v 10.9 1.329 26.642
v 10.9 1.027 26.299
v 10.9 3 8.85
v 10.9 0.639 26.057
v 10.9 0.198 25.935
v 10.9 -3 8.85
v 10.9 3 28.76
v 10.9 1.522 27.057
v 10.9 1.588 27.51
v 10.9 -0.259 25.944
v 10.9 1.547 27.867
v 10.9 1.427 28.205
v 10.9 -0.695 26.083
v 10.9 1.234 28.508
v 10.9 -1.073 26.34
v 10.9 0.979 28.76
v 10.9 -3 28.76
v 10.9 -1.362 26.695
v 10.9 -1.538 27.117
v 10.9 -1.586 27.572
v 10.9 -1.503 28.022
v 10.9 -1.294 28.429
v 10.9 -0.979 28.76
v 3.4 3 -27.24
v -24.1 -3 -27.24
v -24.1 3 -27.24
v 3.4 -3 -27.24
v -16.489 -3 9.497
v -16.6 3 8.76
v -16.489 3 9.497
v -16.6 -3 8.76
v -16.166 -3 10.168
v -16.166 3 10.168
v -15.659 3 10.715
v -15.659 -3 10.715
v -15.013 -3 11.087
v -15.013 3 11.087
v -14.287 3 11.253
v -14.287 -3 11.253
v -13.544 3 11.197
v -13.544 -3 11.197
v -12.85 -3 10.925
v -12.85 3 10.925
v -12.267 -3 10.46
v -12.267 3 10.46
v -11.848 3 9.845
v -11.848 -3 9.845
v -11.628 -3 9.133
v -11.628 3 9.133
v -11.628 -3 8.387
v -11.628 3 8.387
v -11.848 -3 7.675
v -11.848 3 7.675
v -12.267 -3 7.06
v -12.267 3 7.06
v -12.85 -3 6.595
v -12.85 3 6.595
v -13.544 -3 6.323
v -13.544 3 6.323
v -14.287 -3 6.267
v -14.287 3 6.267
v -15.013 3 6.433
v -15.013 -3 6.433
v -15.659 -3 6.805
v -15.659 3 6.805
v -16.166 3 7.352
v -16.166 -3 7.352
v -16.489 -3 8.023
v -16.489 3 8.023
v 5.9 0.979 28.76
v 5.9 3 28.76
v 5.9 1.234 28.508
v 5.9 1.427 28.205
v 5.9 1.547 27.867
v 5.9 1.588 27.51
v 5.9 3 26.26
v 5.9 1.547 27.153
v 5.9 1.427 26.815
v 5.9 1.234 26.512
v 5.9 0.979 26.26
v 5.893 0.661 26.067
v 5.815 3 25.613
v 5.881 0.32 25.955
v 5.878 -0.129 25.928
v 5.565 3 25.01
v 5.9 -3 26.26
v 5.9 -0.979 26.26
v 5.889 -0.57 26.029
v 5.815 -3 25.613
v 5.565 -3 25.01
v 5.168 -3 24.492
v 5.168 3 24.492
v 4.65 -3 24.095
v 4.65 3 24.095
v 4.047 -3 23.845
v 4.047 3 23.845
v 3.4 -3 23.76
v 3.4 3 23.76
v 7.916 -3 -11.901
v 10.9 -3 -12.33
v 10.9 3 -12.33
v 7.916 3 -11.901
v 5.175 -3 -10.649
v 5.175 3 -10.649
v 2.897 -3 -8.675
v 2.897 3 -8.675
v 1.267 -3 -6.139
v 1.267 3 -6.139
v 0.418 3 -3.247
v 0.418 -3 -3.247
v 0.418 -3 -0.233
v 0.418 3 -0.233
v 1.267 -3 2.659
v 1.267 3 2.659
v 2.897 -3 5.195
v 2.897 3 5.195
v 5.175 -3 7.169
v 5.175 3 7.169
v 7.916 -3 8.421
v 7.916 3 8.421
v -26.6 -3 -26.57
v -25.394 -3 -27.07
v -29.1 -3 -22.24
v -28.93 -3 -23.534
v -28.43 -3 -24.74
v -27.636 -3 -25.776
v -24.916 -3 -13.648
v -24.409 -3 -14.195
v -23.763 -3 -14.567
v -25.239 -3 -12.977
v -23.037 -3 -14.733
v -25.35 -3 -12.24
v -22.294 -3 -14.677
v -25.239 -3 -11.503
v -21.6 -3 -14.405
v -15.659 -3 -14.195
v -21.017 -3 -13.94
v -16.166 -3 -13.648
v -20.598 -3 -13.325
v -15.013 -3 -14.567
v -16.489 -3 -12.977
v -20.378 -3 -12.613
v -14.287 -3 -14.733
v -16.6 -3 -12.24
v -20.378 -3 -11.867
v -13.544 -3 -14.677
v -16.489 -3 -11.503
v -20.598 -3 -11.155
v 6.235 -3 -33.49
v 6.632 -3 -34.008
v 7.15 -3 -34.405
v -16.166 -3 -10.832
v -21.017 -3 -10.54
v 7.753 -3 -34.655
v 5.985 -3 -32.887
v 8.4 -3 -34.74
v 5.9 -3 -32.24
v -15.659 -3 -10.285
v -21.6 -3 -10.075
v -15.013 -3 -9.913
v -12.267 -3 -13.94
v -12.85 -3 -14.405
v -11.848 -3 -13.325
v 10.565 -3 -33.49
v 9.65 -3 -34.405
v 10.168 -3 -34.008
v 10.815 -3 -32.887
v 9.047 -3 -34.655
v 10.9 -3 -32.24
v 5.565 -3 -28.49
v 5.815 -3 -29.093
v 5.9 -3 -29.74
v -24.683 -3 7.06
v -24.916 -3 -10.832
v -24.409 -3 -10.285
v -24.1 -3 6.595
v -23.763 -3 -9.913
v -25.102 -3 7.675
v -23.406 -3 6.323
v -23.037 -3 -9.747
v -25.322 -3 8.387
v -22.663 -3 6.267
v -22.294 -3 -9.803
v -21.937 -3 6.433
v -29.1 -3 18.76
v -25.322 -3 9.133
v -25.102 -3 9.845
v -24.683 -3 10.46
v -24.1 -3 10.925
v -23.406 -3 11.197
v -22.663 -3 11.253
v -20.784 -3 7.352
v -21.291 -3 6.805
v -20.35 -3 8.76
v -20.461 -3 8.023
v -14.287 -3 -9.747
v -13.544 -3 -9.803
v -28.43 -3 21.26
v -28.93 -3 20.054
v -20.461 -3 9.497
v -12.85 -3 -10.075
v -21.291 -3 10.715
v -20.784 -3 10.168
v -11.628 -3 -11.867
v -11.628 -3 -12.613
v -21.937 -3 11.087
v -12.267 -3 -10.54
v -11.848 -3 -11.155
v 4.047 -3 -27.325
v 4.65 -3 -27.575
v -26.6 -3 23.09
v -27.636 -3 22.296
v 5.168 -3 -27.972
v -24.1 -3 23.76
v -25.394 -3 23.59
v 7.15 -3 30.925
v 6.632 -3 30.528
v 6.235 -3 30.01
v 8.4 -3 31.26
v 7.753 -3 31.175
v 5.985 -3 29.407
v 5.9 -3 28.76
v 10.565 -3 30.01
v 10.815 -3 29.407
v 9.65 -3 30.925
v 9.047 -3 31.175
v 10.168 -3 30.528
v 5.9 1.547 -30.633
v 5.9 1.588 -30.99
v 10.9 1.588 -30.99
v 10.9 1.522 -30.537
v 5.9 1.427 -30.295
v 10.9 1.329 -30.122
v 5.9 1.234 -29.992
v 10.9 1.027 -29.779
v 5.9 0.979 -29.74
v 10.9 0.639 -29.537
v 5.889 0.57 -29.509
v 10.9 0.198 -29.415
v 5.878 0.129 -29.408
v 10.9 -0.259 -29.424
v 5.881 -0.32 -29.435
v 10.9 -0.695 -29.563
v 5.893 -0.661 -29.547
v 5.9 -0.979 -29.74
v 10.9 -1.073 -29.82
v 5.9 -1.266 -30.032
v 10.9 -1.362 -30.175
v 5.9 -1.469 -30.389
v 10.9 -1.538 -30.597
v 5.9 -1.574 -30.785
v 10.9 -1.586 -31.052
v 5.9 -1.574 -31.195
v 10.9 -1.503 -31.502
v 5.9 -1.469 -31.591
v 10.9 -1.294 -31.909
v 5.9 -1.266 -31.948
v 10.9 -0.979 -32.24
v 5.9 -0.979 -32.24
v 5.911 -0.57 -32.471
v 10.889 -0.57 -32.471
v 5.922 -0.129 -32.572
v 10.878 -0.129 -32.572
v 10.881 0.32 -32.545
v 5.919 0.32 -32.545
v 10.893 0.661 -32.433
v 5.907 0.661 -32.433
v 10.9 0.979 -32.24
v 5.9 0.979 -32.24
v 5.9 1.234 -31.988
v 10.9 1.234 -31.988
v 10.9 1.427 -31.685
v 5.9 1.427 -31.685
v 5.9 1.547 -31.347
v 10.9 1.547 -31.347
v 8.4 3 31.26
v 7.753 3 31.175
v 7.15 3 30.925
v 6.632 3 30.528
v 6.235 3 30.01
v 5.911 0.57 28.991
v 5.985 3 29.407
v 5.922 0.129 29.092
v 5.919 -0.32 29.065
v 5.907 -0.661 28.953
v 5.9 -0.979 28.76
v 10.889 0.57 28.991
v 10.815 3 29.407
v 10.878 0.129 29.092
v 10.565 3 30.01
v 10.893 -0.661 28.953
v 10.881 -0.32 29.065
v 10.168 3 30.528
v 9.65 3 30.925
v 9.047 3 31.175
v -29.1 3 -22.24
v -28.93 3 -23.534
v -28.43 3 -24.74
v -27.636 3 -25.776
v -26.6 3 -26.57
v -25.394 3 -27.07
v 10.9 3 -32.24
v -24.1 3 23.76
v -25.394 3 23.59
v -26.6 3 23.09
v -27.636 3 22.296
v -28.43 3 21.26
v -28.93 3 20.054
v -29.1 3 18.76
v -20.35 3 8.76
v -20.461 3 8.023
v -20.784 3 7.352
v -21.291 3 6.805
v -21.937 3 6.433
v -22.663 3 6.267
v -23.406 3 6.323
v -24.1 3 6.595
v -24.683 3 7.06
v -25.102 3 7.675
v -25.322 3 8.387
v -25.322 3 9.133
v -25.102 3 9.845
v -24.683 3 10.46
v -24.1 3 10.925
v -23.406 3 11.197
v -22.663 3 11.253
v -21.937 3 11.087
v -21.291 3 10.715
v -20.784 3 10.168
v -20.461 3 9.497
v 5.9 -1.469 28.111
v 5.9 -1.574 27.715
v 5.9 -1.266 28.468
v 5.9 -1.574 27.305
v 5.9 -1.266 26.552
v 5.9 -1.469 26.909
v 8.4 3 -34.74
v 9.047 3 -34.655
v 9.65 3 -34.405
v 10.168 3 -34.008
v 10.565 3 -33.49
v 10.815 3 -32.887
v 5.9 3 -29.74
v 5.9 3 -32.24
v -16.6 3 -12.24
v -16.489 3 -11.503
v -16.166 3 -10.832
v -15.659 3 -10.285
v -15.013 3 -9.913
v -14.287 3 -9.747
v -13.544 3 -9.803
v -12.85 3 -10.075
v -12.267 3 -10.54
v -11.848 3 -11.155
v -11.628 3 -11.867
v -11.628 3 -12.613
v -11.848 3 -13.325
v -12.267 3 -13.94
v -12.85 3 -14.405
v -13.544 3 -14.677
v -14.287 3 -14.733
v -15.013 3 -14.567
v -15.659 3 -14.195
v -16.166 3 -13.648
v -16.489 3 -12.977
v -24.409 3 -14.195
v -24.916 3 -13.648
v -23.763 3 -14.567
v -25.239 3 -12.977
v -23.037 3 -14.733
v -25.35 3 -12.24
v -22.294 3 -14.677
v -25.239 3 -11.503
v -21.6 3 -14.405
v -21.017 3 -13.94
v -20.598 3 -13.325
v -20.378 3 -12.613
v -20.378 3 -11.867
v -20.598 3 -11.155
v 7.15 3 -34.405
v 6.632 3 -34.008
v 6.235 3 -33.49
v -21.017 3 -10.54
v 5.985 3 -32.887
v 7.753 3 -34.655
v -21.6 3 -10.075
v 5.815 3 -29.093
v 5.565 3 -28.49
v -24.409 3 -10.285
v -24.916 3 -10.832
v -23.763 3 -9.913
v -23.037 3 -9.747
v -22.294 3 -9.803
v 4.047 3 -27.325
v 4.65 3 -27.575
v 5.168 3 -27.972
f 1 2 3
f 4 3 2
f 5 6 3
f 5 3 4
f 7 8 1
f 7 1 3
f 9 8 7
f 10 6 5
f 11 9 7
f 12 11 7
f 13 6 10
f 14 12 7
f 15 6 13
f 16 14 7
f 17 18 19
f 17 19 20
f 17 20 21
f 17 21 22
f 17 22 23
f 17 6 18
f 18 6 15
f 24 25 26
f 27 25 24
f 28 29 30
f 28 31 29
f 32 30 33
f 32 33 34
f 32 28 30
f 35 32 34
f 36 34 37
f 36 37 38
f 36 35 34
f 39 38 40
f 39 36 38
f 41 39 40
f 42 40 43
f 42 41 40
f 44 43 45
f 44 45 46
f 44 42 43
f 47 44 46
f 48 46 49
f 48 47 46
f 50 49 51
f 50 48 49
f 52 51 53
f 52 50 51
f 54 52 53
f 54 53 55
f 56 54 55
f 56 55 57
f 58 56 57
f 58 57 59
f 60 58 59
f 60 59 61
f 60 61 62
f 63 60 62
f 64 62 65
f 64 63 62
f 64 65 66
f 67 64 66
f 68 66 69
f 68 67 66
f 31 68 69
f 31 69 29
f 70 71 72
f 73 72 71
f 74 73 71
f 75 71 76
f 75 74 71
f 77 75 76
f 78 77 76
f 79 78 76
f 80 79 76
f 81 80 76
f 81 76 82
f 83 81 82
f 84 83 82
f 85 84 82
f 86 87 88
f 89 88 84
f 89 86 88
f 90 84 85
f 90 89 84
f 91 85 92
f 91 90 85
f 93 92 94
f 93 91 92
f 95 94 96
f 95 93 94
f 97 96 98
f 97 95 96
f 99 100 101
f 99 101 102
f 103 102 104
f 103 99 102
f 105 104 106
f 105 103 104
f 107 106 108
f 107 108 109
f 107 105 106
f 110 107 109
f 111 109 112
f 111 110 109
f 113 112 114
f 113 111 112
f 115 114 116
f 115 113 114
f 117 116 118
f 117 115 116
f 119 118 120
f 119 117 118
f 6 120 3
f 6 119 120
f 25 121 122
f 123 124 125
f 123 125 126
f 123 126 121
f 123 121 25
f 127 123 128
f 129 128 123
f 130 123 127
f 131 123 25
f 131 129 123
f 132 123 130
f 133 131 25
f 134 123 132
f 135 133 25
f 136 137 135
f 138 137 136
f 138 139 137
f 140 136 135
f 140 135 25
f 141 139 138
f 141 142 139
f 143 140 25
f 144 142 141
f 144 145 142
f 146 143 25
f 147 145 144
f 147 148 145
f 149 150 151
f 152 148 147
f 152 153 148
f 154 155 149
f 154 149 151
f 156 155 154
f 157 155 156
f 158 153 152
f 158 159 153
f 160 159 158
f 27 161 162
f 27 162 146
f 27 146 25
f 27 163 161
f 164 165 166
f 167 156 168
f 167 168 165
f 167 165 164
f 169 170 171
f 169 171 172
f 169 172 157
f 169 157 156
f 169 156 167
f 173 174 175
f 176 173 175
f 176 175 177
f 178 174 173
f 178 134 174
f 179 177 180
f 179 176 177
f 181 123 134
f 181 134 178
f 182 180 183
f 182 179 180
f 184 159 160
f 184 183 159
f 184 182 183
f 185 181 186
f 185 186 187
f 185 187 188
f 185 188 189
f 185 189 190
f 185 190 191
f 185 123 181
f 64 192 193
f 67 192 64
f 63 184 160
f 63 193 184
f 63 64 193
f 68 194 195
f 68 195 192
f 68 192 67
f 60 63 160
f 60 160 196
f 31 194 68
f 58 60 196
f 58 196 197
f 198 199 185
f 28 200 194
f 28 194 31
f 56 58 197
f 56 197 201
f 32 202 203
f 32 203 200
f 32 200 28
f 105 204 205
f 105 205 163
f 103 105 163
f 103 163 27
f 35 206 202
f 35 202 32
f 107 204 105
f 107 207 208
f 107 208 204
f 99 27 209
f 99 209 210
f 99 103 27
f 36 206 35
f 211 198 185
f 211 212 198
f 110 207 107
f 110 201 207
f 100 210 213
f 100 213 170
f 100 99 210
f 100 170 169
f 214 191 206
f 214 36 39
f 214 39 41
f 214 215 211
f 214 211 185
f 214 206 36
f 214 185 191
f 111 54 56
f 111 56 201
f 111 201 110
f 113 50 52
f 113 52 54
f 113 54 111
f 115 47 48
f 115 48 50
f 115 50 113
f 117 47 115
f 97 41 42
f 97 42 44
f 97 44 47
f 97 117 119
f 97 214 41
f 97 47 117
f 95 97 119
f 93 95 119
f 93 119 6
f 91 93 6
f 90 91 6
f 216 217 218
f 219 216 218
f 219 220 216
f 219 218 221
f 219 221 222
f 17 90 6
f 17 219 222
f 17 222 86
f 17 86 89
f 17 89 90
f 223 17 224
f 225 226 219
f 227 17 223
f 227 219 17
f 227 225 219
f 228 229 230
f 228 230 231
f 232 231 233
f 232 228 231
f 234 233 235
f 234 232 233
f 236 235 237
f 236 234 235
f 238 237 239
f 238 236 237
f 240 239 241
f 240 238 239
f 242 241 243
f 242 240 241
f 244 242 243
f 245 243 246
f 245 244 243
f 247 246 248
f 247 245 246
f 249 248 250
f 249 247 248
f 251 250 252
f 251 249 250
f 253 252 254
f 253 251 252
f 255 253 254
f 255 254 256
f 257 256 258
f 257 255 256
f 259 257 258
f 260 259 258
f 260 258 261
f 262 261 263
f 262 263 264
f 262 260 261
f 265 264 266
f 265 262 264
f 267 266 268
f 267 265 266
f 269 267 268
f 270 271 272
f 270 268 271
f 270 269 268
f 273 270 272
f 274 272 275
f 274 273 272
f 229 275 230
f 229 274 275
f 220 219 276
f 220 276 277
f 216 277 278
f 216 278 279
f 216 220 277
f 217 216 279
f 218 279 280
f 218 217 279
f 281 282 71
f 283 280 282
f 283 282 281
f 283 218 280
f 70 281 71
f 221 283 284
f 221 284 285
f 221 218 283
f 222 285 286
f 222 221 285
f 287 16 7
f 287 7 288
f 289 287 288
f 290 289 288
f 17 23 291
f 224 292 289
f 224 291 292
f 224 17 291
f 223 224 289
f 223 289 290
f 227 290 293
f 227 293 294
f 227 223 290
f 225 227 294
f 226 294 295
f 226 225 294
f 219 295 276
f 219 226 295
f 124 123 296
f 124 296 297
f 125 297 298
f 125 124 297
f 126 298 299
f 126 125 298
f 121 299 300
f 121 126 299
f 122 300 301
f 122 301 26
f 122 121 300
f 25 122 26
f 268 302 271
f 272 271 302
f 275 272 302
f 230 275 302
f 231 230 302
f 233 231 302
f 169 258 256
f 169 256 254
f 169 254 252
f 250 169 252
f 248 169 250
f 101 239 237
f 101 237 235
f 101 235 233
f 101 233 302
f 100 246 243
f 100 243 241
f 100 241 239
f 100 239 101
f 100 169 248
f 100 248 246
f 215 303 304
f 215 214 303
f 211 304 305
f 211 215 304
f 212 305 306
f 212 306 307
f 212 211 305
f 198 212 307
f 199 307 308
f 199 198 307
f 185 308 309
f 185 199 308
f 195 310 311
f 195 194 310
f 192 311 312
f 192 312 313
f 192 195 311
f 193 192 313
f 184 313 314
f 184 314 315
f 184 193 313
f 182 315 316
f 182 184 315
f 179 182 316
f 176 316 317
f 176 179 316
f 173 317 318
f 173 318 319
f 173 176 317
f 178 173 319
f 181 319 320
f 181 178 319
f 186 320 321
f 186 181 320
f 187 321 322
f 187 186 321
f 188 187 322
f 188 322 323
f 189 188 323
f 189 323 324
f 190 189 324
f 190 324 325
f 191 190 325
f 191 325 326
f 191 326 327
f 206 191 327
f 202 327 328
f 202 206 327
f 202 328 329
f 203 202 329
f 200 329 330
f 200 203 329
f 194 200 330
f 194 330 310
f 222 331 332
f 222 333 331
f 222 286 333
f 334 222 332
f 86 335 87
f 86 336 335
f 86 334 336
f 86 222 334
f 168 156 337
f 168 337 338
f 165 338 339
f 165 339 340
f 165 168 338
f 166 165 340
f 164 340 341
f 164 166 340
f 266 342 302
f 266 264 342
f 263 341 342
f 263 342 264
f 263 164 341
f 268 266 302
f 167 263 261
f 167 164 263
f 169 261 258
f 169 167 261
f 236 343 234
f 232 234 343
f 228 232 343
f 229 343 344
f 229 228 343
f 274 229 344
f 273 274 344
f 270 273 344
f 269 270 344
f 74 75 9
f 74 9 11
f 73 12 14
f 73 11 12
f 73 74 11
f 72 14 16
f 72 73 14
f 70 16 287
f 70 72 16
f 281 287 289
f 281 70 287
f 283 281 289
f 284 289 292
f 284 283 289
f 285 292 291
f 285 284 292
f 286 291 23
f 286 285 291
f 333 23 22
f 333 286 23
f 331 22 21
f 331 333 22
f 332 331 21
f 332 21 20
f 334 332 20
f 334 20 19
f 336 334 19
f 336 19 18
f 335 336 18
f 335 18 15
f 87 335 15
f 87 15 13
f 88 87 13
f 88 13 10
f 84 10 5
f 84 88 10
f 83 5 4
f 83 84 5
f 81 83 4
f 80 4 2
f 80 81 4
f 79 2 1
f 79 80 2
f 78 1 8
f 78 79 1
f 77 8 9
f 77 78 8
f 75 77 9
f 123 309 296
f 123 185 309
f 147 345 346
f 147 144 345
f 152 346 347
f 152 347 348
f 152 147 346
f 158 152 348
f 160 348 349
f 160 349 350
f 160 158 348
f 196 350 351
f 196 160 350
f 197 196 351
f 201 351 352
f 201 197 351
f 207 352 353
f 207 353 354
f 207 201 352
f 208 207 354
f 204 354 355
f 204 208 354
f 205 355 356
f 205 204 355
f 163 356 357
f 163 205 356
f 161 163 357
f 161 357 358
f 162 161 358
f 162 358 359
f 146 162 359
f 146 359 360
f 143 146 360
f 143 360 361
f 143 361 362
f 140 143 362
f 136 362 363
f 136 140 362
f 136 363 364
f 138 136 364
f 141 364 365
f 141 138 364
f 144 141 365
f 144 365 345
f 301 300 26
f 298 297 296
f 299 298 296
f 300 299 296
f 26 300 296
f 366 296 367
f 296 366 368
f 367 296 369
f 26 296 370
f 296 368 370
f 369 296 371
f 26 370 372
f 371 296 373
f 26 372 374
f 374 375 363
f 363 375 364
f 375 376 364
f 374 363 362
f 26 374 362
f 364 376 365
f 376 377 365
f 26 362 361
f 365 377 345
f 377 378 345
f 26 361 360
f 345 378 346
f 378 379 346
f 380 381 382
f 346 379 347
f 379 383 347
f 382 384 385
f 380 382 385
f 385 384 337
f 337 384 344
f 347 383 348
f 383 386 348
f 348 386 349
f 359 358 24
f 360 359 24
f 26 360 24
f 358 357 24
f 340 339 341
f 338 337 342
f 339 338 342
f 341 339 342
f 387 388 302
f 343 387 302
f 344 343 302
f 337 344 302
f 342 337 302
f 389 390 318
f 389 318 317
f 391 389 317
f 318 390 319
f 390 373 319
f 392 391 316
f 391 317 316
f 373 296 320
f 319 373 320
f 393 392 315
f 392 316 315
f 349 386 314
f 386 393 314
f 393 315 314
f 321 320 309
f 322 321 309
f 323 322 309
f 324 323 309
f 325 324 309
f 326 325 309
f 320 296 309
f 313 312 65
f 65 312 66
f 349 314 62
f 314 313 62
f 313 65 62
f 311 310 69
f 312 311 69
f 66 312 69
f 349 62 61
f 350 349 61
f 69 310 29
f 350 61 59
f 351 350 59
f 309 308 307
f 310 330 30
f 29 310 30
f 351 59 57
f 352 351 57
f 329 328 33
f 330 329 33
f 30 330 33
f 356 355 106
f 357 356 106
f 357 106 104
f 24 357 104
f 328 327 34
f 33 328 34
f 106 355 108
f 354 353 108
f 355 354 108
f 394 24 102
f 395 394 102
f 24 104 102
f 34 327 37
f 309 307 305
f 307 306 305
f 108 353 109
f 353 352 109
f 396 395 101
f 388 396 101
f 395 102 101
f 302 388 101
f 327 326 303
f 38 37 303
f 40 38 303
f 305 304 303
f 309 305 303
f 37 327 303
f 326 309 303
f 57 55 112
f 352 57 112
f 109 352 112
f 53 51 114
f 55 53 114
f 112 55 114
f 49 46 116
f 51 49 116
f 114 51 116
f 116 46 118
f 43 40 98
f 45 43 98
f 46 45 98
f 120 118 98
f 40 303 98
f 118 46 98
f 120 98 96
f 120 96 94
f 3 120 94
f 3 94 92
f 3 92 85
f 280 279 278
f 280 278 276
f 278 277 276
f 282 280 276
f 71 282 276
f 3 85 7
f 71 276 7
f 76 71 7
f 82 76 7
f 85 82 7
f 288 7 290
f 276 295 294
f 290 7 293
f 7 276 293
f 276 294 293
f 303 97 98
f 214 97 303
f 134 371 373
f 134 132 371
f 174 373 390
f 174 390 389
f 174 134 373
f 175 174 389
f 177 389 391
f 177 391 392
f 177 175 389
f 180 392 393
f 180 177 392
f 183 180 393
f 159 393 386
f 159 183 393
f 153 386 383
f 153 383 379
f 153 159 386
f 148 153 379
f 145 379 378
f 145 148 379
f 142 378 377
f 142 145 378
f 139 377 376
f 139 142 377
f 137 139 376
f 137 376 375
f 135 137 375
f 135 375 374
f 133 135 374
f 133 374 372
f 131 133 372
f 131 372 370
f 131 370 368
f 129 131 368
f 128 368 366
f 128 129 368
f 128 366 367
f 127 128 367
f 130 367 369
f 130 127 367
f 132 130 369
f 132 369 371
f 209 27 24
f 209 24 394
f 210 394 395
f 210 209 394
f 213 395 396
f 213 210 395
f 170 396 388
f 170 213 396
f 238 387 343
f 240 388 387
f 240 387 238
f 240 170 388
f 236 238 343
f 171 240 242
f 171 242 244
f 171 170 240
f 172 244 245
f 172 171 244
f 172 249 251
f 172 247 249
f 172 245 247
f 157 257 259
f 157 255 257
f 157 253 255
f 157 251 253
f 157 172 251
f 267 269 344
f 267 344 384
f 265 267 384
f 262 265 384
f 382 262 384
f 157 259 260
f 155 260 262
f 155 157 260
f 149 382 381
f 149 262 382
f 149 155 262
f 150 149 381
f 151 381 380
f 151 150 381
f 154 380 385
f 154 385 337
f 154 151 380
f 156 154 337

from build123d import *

# Parameters (mm, degrees)
F1_DEPTH = 3
F2_R     = 1.5875
F3_DEPTH = 10.901


with BuildPart() as f1:
    # F0 (on Front) → F1 (new body, symmetric)
    with BuildSketch(Plane.XZ):
        with BuildLine():
            Line((-29.1, 18.76), (-29.1, 8.76))
            Line((-29.1, 8.76), (-29.1, -12.24))
            Line((-29.1, -12.24), (-29.1, -22.24))
            ThreePointArc((-29.1, -22.24), (-27.635534, -25.775534), (-24.1, -27.24))
            Line((-24.1, -27.24), (3.4, -27.24))
            ThreePointArc((3.4, -27.24), (5.167767, -27.972233), (5.9, -29.74))
            Line((5.9, -29.74), (5.9, -32.24))
            ThreePointArc((5.9, -32.24), (6.632233, -34.007767), (8.4, -34.74))
            ThreePointArc((8.4, -34.74), (10.167767, -34.007767), (10.9, -32.24))
            Line((10.9, -32.24), (10.9, -30.99))
            Line((10.9, -30.99), (10.9, -27.24))
            Line((10.9, -27.24), (10.9, -12.33))
            ThreePointArc((10.9, -12.33), (0.31, -1.74), (10.9, 8.85))
            Line((10.9, 8.85), (10.9, 23.76))
            Line((10.9, 23.76), (10.9, 27.51))
            Line((10.9, 27.51), (10.9, 28.76))
            ThreePointArc((10.9, 28.76), (10.167767, 30.527767), (8.4, 31.26))
            ThreePointArc((8.4, 31.26), (6.632233, 30.527767), (5.9, 28.76))
            Line((5.9, 28.76), (5.9, 26.26))
            ThreePointArc((5.9, 26.26), (5.167767, 24.492233), (3.4, 23.76))
            Line((3.4, 23.76), (-24.1, 23.76))
            ThreePointArc((-24.1, 23.76), (-27.635534, 22.295534), (-29.1, 18.76))
        make_face()
        with BuildLine():
            ThreePointArc((-20.35, -12.24), (-22.85, -14.74), (-25.35, -12.24))
            ThreePointArc((-25.35, -12.24), (-22.85, -9.74), (-20.35, -12.24))
        make_face(mode=Mode.SUBTRACT)
        with BuildLine():
            ThreePointArc((-11.6, -12.24), (-14.1, -14.74), (-16.6, -12.24))
            ThreePointArc((-16.6, -12.24), (-14.1, -9.74), (-11.6, -12.24))
        make_face(mode=Mode.SUBTRACT)
        with BuildLine():
            ThreePointArc((-25.35, 8.76), (-22.85, 11.26), (-20.35, 8.76))
            ThreePointArc((-20.35, 8.76), (-22.85, 6.26), (-25.35, 8.76))
        make_face(mode=Mode.SUBTRACT)
        with BuildLine():
            ThreePointArc((-11.6, 8.76), (-14.1, 6.26), (-16.6, 8.76))
            ThreePointArc((-16.6, 8.76), (-14.1, 11.26), (-11.6, 8.76))
        make_face(mode=Mode.SUBTRACT)
    extrude(amount=F1_DEPTH, both=True)

    # F2 (on Right) → F3 (cut, through all)
    with BuildSketch(Plane.YZ):
        with Locations((0, 27.51)):
            Circle(F2_R)
        with Locations((0, -30.99)):
            Circle(F2_R)
    extrude(amount=F3_DEPTH, mode=Mode.SUBTRACT)


solid = f1.part
